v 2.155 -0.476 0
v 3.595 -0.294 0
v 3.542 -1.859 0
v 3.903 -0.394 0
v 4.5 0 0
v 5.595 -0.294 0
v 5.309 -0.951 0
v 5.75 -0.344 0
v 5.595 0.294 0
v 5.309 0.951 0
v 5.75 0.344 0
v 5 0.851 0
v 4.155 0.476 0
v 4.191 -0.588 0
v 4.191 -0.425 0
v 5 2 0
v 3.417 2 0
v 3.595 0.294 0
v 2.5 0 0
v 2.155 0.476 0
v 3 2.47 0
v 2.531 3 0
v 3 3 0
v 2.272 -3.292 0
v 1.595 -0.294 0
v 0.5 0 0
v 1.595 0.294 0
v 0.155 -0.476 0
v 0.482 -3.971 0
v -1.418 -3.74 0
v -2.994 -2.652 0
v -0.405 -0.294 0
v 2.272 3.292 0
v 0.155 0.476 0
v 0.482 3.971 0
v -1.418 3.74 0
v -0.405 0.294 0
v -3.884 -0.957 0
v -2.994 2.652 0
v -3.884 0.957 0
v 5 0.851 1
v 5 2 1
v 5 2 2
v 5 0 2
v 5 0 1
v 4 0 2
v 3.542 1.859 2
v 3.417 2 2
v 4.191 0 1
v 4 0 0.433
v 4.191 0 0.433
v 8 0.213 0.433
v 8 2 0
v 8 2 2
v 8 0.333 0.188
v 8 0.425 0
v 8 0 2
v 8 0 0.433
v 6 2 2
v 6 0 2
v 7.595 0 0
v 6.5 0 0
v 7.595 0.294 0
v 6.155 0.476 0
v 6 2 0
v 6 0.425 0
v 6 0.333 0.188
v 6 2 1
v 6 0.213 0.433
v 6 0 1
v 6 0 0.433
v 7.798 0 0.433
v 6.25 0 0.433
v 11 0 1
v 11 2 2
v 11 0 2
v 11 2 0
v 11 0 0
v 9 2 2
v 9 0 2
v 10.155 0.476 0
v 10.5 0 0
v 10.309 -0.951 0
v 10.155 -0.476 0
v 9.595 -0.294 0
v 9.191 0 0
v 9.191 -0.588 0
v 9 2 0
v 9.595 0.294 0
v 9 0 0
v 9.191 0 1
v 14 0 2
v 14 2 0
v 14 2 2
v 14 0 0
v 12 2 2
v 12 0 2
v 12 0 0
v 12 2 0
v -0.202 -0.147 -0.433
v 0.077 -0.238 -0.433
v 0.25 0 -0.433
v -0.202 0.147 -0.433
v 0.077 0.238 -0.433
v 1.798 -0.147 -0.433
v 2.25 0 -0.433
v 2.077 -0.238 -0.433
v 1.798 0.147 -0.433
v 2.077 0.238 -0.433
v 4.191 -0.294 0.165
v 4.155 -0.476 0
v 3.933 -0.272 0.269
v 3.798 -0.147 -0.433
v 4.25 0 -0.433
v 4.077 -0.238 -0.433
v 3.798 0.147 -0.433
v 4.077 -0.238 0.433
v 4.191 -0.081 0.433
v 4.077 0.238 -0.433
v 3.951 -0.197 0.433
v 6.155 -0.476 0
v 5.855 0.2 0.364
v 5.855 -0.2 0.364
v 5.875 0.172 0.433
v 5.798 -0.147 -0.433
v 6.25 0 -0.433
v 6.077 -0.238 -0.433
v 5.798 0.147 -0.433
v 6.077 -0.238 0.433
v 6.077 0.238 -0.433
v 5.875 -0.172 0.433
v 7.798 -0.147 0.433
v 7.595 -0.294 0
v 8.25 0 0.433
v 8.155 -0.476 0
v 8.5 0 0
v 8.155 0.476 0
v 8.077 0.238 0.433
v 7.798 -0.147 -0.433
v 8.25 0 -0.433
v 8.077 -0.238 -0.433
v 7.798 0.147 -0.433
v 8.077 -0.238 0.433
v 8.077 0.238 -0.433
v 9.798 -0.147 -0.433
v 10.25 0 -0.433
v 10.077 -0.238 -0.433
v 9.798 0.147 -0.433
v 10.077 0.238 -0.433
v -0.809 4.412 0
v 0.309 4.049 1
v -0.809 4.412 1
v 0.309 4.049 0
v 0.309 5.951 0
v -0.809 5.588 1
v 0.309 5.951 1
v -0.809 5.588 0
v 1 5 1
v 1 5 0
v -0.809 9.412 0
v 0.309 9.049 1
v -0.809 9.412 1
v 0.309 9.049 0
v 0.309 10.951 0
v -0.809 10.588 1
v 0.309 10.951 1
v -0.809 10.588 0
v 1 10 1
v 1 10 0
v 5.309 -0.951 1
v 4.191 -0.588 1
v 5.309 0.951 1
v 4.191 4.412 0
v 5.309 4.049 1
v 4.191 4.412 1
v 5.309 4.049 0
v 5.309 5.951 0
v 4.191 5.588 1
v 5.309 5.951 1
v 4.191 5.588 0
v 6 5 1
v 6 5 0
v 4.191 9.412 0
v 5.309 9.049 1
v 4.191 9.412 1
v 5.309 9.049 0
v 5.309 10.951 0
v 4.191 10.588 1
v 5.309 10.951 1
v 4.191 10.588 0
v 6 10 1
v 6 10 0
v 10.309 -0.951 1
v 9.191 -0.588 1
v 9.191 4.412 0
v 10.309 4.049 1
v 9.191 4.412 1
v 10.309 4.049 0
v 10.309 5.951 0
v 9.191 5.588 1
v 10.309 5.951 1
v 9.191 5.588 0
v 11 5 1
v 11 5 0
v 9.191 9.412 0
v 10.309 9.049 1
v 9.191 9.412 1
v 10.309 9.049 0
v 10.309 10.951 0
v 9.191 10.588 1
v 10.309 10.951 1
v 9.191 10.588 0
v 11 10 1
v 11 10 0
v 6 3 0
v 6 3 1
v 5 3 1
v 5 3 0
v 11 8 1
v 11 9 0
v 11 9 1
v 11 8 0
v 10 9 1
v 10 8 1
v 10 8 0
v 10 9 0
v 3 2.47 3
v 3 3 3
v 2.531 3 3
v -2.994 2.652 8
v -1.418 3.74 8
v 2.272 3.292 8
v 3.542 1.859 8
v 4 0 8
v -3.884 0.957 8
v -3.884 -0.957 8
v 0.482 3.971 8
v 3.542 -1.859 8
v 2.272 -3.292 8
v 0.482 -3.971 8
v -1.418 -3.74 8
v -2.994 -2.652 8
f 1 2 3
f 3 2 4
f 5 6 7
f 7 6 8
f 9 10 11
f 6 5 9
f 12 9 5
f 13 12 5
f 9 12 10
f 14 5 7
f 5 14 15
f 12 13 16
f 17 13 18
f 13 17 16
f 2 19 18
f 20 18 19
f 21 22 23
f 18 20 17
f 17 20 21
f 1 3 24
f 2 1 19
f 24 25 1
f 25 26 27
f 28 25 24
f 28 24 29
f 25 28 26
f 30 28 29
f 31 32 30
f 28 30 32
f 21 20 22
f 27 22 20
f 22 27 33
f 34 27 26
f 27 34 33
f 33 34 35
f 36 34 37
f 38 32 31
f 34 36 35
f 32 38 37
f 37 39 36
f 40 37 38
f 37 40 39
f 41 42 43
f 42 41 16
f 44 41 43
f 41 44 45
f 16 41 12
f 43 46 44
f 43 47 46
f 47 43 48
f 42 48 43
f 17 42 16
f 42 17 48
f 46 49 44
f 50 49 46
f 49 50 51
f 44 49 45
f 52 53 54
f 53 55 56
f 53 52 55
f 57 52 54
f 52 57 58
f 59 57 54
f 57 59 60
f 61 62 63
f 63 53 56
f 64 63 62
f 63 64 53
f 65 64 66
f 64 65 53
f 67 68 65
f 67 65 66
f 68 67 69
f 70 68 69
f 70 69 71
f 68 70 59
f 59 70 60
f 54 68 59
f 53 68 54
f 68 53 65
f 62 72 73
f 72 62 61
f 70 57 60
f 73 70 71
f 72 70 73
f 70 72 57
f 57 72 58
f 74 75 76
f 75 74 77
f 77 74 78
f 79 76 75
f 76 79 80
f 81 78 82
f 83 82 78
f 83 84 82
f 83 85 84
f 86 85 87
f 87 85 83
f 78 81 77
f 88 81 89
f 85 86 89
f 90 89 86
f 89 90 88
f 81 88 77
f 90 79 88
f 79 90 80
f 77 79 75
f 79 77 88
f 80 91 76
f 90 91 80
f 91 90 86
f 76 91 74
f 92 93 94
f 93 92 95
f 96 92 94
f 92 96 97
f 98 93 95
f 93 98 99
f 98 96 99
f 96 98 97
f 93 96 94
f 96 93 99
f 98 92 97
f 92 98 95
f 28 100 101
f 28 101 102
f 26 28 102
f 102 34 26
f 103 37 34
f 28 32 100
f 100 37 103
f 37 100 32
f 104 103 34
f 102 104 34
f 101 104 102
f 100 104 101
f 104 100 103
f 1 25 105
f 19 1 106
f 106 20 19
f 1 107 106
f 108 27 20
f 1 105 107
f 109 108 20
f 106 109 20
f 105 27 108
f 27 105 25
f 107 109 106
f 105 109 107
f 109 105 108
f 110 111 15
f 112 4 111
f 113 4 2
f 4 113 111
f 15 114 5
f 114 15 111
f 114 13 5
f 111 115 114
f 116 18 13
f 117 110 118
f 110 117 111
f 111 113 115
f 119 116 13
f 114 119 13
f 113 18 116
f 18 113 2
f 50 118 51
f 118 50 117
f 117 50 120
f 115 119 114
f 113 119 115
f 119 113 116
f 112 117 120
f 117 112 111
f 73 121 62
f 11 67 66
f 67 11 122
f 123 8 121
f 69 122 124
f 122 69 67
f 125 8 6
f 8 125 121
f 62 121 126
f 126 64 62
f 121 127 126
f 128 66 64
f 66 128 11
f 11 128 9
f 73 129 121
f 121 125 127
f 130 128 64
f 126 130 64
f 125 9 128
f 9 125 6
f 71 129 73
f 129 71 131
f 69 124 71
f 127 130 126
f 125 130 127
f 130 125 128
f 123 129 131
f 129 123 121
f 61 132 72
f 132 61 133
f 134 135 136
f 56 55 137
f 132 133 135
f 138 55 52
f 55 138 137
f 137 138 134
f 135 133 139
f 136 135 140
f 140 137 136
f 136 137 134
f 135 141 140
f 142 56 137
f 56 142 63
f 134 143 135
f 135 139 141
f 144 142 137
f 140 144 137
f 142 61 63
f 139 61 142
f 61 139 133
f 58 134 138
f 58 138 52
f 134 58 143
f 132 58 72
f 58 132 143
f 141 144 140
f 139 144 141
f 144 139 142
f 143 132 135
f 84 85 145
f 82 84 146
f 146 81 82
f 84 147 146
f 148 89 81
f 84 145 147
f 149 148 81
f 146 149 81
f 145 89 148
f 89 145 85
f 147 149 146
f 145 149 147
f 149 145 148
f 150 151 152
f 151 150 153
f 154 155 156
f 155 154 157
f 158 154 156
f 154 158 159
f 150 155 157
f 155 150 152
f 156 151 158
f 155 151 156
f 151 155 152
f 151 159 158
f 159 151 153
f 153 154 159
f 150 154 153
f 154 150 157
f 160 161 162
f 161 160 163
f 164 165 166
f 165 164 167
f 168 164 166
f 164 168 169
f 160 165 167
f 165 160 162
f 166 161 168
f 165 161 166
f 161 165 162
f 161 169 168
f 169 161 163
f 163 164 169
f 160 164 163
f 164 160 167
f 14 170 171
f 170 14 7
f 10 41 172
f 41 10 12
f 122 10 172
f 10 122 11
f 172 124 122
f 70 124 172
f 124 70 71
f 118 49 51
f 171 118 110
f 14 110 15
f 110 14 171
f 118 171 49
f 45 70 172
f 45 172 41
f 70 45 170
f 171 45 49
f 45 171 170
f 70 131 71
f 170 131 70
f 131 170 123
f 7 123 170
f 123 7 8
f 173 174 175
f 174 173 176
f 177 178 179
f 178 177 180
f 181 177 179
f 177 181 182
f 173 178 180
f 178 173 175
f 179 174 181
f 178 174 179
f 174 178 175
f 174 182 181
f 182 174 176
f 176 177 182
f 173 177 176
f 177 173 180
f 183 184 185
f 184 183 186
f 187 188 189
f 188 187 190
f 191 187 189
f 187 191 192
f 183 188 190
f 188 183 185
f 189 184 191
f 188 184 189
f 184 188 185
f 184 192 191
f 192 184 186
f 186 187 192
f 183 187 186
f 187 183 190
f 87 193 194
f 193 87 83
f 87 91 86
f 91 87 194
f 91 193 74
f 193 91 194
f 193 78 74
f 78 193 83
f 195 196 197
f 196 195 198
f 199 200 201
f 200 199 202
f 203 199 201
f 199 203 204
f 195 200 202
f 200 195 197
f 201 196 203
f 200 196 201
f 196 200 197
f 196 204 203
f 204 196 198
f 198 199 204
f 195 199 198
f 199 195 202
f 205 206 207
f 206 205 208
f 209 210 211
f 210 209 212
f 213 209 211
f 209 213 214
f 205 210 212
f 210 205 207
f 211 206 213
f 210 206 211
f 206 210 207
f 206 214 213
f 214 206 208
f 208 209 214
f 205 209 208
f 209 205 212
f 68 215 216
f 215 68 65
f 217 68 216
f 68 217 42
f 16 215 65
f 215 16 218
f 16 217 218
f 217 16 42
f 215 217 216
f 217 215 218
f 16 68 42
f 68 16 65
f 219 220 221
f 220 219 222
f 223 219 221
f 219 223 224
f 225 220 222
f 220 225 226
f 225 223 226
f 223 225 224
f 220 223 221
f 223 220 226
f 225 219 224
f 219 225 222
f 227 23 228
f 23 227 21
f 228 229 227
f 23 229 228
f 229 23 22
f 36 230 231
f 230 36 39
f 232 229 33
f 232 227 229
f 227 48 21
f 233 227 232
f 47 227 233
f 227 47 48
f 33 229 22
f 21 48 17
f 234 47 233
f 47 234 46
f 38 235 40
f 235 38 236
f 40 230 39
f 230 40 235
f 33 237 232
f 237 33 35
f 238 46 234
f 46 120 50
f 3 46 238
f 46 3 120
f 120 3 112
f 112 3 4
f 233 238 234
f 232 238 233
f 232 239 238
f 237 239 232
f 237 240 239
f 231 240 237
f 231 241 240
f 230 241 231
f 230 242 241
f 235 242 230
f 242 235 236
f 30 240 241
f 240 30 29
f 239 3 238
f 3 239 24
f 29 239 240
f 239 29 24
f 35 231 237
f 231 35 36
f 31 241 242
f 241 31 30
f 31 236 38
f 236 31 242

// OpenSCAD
// Loops, conditionals, let statements.
for (i = [0 : 4]) {
    translate([i * 3, 0, 0]) cube(2);
}

for (i = [0 : 2 : 10]) translate([i, 0, 0]) sphere(0.5);

for (x = [0 : 2], y = [0 : 2]) {
    translate([x * 5, y * 5, 0]) cylinder(h = 1, r = 1);
}

for (p = [[0, 0], [5, 2], [10, 8]]) {
    translate([p[0], p[1], 0]) cube(1);
}

count = 5;
if (count > 3) {
    cube(3);
} else {
    sphere(3);
}

if (count % 2 == 0) cube(1);
else if (count % 3 == 0) sphere(1);
else cylinder(h = 1, r = 0.5);

let (r = 4, h = r * 2) {
    cylinder(h = h, r = r);
}

intersection_for(n = [1 : 6]) {
    rotate([0, 0, n * 60]) translate([5, 0, 0]) circle(8);
}
